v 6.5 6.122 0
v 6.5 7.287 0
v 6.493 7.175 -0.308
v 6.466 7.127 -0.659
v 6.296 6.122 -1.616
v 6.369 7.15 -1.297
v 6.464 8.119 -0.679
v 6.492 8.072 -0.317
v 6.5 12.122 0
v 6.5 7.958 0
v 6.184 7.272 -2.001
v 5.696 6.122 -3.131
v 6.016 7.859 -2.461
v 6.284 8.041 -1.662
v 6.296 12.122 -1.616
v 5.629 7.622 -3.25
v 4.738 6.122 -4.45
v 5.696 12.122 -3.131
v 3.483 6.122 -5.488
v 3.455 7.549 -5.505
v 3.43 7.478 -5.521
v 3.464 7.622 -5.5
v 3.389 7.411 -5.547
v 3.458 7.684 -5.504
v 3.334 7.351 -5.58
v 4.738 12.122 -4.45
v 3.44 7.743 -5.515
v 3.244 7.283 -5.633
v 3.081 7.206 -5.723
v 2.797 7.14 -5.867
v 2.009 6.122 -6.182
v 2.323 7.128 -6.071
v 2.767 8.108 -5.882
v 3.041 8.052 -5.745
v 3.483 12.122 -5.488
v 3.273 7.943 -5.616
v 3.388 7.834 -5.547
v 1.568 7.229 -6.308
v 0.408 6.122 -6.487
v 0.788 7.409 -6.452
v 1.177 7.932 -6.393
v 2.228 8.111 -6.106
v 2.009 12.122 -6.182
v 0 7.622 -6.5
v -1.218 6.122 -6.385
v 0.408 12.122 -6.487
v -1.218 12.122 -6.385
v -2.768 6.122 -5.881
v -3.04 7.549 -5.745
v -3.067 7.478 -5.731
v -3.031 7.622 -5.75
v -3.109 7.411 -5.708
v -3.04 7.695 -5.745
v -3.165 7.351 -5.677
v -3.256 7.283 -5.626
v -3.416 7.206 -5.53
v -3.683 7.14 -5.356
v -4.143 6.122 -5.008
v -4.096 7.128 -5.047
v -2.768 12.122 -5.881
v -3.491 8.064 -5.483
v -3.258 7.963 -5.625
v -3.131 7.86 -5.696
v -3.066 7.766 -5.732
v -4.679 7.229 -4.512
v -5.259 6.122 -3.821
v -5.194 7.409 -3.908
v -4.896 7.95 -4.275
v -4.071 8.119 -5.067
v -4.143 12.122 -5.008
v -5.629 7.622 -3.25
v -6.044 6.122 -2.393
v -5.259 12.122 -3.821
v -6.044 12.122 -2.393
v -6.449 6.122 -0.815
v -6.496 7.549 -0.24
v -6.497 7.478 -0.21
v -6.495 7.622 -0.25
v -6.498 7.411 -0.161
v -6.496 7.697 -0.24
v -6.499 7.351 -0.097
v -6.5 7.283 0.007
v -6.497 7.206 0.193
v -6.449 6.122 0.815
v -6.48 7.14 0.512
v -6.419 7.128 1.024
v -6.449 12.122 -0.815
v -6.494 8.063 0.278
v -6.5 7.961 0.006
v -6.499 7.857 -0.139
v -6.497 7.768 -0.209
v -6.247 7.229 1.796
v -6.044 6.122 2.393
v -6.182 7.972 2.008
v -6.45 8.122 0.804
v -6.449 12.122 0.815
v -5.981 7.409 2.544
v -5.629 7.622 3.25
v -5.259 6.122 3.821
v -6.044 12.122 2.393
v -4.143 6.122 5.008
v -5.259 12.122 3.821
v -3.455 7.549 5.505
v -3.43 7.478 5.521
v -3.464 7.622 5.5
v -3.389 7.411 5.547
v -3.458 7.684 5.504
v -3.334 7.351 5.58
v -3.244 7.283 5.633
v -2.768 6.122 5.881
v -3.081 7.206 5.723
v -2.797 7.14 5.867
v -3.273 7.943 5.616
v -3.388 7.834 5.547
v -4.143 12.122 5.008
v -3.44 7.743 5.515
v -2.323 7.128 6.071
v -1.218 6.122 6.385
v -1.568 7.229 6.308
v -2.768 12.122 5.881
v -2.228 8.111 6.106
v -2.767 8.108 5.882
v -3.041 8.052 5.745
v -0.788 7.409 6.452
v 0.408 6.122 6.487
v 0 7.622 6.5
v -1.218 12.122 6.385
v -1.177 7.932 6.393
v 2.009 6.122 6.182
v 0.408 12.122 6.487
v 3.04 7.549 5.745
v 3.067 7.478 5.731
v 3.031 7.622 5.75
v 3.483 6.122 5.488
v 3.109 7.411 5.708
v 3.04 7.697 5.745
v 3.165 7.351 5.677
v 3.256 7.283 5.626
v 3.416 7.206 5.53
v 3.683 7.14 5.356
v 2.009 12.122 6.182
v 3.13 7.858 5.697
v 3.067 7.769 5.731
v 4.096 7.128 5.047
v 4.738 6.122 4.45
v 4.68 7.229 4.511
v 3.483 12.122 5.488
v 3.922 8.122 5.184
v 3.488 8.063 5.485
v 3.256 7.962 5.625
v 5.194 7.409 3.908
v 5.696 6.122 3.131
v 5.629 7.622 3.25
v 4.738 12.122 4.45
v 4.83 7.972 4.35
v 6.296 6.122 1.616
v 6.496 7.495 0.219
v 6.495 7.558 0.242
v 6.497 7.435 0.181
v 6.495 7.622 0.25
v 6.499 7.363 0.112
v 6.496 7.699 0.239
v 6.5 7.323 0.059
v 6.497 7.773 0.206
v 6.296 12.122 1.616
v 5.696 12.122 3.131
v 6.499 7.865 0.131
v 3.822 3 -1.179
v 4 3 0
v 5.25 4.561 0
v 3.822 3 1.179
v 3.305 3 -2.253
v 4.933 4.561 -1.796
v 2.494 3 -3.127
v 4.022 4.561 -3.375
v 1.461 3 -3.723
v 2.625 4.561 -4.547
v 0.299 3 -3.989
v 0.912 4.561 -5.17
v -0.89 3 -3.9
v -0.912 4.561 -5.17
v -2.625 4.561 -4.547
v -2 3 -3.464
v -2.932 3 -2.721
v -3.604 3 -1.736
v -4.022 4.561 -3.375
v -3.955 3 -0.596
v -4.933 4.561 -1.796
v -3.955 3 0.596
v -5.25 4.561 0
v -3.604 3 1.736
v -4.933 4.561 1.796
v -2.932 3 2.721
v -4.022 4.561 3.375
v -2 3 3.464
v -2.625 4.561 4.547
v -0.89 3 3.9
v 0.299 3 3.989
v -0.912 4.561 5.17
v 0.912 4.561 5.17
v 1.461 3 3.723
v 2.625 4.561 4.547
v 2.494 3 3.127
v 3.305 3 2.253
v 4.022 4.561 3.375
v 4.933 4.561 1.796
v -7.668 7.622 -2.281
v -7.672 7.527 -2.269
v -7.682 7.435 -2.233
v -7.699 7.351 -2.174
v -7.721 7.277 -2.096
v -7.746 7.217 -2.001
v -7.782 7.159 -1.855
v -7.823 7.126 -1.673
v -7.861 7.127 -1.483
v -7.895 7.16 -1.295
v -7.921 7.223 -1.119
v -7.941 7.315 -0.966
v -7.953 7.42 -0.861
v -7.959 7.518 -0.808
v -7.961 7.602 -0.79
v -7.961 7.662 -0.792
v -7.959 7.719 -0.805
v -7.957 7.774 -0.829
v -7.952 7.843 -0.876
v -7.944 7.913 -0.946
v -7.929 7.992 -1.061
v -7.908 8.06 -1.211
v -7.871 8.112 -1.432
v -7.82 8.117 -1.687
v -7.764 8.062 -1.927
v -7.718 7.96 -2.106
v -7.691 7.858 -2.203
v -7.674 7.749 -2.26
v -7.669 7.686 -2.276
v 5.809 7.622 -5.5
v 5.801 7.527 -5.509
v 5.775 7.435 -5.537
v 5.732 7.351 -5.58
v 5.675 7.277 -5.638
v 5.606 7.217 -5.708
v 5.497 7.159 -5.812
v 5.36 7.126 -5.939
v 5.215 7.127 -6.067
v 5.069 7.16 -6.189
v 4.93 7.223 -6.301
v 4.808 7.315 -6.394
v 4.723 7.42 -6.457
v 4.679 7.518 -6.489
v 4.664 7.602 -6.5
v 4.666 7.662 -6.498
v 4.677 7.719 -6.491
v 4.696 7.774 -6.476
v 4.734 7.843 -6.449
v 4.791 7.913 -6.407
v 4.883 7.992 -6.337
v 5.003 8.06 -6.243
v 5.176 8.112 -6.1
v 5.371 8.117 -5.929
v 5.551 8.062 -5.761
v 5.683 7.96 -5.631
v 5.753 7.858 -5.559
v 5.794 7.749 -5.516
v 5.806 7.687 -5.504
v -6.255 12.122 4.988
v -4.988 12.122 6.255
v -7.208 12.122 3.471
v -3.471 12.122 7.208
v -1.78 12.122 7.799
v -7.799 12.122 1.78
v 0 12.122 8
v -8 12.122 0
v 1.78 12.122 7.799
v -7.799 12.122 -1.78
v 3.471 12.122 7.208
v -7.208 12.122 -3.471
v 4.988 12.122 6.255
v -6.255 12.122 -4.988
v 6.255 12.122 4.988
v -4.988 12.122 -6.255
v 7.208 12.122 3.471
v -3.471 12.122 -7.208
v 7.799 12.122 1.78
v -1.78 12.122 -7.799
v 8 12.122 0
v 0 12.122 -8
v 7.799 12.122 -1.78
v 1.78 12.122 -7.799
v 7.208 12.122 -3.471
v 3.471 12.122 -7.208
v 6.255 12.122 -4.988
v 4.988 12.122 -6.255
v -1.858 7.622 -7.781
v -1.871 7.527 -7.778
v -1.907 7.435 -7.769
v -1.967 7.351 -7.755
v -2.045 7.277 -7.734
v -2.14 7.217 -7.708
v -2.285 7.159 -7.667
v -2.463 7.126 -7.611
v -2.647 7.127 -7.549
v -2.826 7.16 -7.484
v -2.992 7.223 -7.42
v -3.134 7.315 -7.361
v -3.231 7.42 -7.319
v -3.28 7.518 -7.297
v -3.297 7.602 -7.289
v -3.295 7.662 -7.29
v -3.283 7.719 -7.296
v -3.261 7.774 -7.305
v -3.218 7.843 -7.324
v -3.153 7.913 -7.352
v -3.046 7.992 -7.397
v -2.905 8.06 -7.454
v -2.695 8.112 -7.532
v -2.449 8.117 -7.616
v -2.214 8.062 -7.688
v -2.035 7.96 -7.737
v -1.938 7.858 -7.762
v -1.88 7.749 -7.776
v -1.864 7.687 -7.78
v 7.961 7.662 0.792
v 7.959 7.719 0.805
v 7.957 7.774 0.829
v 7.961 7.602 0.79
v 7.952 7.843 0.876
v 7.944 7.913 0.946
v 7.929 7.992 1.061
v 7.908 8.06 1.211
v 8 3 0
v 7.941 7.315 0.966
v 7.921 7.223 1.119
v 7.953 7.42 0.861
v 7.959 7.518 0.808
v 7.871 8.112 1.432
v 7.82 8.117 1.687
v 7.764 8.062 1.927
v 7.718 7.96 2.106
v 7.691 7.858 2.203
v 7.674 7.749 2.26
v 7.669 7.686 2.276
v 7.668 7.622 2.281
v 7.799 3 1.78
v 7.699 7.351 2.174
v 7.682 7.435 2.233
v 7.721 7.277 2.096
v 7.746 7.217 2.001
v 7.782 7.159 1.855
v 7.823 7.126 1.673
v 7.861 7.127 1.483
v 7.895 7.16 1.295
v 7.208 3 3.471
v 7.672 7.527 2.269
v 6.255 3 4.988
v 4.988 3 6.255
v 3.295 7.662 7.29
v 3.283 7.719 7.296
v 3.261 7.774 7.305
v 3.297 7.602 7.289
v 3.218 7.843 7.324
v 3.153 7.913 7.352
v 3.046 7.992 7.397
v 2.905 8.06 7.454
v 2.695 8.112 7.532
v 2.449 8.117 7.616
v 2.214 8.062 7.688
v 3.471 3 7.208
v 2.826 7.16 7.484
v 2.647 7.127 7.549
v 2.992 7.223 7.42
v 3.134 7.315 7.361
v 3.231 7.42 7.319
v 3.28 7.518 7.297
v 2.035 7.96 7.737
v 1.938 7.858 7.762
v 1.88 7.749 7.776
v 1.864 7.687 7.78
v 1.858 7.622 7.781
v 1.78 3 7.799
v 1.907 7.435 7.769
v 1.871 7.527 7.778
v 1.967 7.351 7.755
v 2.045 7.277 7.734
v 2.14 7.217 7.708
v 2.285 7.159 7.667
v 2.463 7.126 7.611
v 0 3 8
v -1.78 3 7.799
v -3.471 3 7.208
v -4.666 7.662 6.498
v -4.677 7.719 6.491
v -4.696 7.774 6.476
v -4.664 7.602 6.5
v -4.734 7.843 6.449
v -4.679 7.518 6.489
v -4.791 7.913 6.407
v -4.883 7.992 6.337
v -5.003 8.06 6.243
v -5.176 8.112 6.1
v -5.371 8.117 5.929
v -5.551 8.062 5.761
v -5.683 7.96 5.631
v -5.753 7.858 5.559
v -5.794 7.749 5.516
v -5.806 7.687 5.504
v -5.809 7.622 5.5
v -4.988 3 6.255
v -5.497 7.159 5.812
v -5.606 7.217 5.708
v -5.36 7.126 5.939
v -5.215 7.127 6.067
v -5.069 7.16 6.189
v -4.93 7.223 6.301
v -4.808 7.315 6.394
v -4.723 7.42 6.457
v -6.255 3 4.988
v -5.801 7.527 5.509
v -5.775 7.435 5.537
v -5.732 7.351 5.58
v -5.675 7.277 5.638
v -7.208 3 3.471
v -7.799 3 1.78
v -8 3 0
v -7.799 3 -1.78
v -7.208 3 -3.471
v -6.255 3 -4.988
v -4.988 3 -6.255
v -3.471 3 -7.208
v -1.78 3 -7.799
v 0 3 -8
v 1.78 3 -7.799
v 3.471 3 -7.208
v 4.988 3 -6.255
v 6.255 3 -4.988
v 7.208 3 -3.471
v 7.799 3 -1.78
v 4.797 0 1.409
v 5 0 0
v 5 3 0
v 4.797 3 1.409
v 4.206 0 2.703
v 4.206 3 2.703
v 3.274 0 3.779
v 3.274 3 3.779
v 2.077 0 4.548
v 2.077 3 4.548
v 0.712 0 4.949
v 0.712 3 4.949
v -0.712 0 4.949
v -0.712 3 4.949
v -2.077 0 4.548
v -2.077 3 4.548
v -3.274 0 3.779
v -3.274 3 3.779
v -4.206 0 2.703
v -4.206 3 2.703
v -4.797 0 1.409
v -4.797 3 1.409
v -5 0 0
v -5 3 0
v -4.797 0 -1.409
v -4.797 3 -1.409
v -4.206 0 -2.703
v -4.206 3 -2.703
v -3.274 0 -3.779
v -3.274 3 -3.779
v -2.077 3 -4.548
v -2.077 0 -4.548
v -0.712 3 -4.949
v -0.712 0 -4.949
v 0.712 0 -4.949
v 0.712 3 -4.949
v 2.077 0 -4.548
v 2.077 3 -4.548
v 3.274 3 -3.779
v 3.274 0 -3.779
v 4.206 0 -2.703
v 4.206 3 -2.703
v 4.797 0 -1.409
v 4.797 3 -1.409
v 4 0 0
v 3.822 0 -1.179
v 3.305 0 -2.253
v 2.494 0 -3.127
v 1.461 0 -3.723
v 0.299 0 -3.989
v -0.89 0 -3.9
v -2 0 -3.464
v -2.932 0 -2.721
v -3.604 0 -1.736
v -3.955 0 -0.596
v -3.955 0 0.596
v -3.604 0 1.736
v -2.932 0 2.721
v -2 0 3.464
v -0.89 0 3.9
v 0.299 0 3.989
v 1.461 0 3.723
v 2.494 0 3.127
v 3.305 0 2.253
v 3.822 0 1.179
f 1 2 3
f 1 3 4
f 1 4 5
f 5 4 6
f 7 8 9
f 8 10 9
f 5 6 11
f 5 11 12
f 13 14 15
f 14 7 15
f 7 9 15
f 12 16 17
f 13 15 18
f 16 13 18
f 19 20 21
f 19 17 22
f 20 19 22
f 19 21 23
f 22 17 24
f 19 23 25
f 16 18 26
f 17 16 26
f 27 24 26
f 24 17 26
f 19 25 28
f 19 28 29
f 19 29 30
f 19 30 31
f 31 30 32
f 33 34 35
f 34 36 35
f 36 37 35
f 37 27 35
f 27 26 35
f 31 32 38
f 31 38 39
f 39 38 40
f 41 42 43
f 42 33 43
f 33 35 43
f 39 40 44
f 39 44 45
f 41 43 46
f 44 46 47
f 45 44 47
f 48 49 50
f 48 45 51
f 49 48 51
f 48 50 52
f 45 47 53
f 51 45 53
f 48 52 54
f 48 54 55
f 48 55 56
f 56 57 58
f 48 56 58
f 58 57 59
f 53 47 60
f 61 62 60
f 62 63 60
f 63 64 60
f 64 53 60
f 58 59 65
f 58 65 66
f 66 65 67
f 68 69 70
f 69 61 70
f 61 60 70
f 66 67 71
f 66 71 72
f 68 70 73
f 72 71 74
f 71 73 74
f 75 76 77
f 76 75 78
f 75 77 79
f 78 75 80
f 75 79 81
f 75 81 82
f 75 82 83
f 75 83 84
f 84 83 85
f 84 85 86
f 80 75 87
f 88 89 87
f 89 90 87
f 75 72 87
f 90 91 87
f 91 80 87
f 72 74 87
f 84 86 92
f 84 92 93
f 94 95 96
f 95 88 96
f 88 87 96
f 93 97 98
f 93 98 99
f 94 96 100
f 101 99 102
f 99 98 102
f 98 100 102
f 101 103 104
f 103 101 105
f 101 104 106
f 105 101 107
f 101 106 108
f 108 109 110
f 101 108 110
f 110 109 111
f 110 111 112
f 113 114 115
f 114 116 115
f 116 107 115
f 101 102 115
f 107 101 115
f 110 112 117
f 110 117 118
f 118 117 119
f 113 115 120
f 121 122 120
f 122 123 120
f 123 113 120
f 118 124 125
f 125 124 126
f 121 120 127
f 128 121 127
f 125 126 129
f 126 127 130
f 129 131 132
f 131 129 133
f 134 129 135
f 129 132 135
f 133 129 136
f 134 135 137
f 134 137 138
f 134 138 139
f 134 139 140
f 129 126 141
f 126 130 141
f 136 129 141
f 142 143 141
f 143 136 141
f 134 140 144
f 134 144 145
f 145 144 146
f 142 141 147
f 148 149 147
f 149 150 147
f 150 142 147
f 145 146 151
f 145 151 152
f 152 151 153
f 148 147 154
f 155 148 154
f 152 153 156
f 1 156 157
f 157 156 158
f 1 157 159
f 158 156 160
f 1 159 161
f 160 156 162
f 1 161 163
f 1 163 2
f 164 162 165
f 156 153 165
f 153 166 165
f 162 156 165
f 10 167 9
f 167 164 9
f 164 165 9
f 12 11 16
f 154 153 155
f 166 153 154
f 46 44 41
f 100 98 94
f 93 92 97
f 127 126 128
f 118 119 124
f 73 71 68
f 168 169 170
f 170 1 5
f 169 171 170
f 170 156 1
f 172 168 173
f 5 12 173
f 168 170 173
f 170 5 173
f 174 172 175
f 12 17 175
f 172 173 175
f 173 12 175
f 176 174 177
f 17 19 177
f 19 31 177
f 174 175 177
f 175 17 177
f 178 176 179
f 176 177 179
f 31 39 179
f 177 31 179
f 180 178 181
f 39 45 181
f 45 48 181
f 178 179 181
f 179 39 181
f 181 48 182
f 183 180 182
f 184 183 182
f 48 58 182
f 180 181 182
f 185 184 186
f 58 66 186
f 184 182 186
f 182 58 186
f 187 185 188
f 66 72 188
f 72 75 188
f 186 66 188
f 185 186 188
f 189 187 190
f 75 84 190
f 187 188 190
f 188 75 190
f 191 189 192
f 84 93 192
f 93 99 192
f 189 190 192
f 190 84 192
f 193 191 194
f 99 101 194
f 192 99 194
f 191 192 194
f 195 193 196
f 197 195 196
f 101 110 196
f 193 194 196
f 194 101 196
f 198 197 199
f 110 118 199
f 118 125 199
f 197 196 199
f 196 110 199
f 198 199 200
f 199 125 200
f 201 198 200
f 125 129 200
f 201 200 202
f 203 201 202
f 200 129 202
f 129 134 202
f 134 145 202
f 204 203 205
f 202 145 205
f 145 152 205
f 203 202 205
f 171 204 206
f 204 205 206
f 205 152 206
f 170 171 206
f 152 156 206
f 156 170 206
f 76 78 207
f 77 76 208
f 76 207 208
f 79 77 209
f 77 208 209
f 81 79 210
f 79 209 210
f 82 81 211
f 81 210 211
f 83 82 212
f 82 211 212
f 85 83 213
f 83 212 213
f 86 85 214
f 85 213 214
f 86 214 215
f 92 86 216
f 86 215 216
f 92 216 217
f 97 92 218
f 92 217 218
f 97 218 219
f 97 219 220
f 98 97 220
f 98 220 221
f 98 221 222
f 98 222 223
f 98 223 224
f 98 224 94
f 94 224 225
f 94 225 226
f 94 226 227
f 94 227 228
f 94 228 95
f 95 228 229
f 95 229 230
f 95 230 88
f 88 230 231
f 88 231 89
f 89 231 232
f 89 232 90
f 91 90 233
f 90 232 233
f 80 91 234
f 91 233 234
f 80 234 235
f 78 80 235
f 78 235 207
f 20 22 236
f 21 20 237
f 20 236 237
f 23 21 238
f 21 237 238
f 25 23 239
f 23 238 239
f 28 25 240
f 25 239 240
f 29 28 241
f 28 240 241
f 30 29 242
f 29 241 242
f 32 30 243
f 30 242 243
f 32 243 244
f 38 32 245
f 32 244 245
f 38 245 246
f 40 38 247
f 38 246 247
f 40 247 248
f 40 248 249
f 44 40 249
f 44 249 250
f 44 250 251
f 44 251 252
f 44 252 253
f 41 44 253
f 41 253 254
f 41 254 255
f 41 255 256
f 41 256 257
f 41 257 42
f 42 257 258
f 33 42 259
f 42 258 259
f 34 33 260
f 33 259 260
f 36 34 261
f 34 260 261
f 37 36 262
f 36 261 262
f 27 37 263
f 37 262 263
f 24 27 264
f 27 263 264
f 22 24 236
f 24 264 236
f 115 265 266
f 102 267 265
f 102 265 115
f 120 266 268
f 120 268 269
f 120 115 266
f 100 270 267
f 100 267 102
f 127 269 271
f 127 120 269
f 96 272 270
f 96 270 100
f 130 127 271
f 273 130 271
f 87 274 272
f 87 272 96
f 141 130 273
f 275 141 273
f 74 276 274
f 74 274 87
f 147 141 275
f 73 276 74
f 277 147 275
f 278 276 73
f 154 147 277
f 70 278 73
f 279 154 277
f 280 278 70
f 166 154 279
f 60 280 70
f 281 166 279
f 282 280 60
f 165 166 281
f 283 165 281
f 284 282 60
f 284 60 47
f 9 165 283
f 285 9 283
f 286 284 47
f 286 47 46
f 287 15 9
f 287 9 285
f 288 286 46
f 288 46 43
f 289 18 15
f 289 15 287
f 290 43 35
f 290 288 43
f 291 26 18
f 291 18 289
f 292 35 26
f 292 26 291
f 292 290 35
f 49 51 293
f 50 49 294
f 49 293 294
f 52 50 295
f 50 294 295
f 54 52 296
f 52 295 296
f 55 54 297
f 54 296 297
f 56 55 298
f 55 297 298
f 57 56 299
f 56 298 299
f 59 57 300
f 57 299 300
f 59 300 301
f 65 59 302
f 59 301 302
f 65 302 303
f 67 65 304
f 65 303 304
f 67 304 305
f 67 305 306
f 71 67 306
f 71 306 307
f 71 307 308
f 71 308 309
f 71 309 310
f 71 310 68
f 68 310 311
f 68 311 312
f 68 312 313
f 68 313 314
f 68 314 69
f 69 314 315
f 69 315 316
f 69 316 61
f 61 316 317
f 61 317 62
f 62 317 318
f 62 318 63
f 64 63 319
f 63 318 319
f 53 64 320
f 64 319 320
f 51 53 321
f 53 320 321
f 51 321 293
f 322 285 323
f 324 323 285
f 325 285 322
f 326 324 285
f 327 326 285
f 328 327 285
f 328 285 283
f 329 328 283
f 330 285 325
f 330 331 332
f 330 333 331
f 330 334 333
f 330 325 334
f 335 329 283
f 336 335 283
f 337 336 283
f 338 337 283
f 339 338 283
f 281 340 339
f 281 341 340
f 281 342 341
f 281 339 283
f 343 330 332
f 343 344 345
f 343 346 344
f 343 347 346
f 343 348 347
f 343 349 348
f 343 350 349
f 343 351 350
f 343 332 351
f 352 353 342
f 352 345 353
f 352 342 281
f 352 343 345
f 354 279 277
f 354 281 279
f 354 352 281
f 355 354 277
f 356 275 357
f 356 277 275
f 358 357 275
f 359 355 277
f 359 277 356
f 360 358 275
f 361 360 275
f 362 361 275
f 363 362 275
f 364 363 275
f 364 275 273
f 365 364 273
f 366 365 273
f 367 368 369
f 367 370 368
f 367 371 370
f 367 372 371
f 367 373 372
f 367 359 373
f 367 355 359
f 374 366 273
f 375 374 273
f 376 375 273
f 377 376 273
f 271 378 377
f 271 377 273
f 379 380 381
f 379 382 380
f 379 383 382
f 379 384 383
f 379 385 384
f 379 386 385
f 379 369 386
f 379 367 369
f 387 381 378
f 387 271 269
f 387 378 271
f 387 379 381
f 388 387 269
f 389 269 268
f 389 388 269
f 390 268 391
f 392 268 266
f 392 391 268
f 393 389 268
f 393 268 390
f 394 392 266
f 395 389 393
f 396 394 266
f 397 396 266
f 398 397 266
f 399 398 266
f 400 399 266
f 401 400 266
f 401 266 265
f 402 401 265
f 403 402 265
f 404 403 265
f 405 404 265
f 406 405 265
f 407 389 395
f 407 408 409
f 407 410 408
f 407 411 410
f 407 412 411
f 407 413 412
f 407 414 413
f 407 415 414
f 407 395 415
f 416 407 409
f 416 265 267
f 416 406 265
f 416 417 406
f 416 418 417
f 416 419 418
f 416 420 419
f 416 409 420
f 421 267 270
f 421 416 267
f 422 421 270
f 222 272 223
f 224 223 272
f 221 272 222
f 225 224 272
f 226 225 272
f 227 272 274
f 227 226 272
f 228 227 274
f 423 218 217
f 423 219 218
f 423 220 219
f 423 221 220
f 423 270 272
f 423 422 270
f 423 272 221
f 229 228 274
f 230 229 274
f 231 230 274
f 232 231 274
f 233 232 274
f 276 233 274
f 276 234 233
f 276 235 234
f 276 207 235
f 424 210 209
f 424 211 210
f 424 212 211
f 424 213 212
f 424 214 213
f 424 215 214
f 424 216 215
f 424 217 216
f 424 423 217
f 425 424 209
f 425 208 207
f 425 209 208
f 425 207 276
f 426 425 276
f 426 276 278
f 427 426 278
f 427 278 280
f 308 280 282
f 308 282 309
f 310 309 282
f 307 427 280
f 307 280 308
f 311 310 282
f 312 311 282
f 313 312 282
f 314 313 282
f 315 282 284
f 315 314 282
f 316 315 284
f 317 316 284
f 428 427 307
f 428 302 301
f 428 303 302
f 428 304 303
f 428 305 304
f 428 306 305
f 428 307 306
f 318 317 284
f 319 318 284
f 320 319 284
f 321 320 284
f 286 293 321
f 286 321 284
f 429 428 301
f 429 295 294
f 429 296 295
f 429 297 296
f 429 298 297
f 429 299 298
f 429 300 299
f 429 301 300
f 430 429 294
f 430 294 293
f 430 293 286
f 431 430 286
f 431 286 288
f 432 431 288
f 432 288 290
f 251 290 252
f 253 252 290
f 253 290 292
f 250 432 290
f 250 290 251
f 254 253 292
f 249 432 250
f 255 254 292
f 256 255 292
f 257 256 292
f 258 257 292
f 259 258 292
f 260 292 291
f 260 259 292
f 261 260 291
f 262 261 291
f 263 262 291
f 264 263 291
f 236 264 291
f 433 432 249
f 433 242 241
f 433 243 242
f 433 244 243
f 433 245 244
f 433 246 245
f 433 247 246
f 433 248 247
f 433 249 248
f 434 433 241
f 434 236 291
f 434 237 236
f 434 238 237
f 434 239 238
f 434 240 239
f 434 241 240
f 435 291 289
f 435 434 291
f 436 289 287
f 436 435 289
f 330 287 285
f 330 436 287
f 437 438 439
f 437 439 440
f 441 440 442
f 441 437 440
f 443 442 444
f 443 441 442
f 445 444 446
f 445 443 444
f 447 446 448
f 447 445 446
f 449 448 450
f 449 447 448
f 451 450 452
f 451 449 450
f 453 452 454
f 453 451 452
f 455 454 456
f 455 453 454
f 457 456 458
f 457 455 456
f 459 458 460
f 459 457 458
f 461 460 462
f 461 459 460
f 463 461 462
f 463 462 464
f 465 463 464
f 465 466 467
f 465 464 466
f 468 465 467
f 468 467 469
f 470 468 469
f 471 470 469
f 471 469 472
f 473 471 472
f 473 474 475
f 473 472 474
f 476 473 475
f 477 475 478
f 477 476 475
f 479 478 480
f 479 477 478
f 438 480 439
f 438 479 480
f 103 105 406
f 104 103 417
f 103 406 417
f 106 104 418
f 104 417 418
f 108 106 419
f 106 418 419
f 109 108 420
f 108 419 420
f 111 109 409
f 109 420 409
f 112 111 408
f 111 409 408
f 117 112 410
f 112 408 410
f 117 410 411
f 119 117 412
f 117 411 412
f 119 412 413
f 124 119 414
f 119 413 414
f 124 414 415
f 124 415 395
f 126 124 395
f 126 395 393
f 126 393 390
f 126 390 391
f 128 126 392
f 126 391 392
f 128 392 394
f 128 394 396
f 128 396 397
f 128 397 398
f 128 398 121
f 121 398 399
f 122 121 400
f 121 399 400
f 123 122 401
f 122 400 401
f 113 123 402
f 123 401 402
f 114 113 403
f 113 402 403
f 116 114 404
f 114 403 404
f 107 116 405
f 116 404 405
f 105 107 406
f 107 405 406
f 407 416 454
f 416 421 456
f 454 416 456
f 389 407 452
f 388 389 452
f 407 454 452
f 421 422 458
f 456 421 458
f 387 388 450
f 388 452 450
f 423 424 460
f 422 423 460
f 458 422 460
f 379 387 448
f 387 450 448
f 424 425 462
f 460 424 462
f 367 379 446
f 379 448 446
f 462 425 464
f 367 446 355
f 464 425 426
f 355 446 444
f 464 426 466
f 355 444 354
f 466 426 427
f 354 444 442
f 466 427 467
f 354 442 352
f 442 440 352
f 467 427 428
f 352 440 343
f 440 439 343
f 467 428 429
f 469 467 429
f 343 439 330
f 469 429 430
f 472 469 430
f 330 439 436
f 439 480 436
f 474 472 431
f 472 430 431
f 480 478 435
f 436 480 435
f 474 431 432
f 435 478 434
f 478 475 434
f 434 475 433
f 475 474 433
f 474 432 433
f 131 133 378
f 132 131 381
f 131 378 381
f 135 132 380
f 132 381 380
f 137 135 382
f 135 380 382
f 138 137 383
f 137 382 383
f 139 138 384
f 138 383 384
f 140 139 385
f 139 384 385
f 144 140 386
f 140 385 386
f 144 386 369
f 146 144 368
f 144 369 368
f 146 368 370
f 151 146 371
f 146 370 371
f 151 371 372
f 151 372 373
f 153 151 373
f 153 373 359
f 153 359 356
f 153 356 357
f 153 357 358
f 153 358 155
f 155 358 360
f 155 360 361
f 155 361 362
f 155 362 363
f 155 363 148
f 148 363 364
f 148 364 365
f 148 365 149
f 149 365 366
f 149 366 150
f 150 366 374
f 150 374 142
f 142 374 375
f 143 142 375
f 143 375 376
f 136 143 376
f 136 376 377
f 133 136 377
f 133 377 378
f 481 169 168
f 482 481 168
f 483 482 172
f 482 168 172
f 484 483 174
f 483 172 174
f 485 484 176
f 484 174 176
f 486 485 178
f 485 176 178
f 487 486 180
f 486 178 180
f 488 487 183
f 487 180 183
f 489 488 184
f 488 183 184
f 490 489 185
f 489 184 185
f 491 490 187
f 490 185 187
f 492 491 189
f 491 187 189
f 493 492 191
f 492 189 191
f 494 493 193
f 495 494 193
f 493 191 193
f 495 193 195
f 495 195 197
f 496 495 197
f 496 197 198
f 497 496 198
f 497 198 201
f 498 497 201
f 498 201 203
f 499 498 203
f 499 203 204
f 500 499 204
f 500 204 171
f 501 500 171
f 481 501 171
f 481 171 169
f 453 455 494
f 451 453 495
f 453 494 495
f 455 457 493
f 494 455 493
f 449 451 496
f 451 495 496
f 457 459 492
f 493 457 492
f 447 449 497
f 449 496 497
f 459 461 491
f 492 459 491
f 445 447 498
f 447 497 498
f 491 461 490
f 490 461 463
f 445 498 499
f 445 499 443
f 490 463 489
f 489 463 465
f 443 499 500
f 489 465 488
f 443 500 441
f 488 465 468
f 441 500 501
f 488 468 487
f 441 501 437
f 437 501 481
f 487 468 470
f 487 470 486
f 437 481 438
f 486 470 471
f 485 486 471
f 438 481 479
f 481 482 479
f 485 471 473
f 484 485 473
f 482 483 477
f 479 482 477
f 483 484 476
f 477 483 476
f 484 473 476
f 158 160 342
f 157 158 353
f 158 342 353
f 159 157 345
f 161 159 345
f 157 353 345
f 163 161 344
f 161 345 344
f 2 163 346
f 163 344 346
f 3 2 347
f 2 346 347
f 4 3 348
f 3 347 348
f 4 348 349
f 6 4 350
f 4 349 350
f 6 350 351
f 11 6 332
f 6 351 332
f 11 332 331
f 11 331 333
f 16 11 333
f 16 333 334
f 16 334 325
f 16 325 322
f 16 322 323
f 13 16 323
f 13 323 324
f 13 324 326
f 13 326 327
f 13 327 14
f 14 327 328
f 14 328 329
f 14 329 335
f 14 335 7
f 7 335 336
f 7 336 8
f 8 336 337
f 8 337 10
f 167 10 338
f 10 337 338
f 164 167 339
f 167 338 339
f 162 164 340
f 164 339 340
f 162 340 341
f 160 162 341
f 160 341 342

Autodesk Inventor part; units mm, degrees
ref_plane "YZ Plane" through (0, 0, 0) normal (1, 0, 0) x (0, 1, 0)
ref_plane "XZ Plane" through (0, 0, 0) normal (0, 1, 0) x (-1, 0, 0)
sketch "Sketch1" plane through (0, 0, 0) normal (0, 0, 1) x (1, 0, 0)
  line L0 (4, 0) -> (4, 3)
  line L1 (4, 3) -> (6.5, 6.1225)
  line L2 (6.5, 6.1225) -> (6.5, 12.1225)
  line L3 (6.5, 12.1225) -> (8, 12.1225)
  line L4 (8, 12.1225) -> (8, 3)
  line L5 (8, 3) -> (5, 3)
  line L6 (5, 3) -> (5, 0)
  line L7 (5, 0) -> (4, 0)
  line L8 (0, -2.6844) -> (0, 16.1063) projected
  point P0 (0, 0)
  dimension "d0" = 6.5
  dimension "d2" = 1.5
  dimension "d7" = 3
  dimension "d31" = 4
  dimension "d32" = 1
  dimension "d33" = 0
  dimension "d35" = 3
  dimension "d36" = 6
  dimension "d37" = 4
revolve "Revolution1" add sketch "Sketch1" angle 360 about axis through (0, -10, 0) along (0, 1, 0)
sketch "Sketch2" plane through (0, 0, 0) normal (1, 0, 0) x (0, 1, 0)
  line L0 (6.1225, 6.5) -> (12.1225, 6.5) projected
  point P0 (0, 0)
  point P1 (13.4219, 6.5)
ref_plane "Work Plane1" through (0, 13.4219, 6.5) normal (0, 0, -1) x (-1, 0, 0)
sketch "Sketch4" plane through (0, 0, 0) normal (1, 0, 0) x (0, 1, 0)
  line L0 (6.1225, 6.5) -> (6.1225, -6.5) projected
  line L1 (16.1063, 6.5) -> (-2.6844, 6.5) projected
  point P0 (0, 0)
  point P1 (7.6225, 6)
  dimension "d19" = 1.5
  dimension "d20" = 0.5
hole "Hole2" at (0, 7.6225, 6) direction (-1, 0, 0) diameter 1 end through all
pattern_circular "Circular Pattern1" count 6 over 360 about axis through (0, -10, 0) along (0, 1, 0) of "Hole2"
properties part number "bottom injector" material "Brass, Soft Yellow, Welded"
